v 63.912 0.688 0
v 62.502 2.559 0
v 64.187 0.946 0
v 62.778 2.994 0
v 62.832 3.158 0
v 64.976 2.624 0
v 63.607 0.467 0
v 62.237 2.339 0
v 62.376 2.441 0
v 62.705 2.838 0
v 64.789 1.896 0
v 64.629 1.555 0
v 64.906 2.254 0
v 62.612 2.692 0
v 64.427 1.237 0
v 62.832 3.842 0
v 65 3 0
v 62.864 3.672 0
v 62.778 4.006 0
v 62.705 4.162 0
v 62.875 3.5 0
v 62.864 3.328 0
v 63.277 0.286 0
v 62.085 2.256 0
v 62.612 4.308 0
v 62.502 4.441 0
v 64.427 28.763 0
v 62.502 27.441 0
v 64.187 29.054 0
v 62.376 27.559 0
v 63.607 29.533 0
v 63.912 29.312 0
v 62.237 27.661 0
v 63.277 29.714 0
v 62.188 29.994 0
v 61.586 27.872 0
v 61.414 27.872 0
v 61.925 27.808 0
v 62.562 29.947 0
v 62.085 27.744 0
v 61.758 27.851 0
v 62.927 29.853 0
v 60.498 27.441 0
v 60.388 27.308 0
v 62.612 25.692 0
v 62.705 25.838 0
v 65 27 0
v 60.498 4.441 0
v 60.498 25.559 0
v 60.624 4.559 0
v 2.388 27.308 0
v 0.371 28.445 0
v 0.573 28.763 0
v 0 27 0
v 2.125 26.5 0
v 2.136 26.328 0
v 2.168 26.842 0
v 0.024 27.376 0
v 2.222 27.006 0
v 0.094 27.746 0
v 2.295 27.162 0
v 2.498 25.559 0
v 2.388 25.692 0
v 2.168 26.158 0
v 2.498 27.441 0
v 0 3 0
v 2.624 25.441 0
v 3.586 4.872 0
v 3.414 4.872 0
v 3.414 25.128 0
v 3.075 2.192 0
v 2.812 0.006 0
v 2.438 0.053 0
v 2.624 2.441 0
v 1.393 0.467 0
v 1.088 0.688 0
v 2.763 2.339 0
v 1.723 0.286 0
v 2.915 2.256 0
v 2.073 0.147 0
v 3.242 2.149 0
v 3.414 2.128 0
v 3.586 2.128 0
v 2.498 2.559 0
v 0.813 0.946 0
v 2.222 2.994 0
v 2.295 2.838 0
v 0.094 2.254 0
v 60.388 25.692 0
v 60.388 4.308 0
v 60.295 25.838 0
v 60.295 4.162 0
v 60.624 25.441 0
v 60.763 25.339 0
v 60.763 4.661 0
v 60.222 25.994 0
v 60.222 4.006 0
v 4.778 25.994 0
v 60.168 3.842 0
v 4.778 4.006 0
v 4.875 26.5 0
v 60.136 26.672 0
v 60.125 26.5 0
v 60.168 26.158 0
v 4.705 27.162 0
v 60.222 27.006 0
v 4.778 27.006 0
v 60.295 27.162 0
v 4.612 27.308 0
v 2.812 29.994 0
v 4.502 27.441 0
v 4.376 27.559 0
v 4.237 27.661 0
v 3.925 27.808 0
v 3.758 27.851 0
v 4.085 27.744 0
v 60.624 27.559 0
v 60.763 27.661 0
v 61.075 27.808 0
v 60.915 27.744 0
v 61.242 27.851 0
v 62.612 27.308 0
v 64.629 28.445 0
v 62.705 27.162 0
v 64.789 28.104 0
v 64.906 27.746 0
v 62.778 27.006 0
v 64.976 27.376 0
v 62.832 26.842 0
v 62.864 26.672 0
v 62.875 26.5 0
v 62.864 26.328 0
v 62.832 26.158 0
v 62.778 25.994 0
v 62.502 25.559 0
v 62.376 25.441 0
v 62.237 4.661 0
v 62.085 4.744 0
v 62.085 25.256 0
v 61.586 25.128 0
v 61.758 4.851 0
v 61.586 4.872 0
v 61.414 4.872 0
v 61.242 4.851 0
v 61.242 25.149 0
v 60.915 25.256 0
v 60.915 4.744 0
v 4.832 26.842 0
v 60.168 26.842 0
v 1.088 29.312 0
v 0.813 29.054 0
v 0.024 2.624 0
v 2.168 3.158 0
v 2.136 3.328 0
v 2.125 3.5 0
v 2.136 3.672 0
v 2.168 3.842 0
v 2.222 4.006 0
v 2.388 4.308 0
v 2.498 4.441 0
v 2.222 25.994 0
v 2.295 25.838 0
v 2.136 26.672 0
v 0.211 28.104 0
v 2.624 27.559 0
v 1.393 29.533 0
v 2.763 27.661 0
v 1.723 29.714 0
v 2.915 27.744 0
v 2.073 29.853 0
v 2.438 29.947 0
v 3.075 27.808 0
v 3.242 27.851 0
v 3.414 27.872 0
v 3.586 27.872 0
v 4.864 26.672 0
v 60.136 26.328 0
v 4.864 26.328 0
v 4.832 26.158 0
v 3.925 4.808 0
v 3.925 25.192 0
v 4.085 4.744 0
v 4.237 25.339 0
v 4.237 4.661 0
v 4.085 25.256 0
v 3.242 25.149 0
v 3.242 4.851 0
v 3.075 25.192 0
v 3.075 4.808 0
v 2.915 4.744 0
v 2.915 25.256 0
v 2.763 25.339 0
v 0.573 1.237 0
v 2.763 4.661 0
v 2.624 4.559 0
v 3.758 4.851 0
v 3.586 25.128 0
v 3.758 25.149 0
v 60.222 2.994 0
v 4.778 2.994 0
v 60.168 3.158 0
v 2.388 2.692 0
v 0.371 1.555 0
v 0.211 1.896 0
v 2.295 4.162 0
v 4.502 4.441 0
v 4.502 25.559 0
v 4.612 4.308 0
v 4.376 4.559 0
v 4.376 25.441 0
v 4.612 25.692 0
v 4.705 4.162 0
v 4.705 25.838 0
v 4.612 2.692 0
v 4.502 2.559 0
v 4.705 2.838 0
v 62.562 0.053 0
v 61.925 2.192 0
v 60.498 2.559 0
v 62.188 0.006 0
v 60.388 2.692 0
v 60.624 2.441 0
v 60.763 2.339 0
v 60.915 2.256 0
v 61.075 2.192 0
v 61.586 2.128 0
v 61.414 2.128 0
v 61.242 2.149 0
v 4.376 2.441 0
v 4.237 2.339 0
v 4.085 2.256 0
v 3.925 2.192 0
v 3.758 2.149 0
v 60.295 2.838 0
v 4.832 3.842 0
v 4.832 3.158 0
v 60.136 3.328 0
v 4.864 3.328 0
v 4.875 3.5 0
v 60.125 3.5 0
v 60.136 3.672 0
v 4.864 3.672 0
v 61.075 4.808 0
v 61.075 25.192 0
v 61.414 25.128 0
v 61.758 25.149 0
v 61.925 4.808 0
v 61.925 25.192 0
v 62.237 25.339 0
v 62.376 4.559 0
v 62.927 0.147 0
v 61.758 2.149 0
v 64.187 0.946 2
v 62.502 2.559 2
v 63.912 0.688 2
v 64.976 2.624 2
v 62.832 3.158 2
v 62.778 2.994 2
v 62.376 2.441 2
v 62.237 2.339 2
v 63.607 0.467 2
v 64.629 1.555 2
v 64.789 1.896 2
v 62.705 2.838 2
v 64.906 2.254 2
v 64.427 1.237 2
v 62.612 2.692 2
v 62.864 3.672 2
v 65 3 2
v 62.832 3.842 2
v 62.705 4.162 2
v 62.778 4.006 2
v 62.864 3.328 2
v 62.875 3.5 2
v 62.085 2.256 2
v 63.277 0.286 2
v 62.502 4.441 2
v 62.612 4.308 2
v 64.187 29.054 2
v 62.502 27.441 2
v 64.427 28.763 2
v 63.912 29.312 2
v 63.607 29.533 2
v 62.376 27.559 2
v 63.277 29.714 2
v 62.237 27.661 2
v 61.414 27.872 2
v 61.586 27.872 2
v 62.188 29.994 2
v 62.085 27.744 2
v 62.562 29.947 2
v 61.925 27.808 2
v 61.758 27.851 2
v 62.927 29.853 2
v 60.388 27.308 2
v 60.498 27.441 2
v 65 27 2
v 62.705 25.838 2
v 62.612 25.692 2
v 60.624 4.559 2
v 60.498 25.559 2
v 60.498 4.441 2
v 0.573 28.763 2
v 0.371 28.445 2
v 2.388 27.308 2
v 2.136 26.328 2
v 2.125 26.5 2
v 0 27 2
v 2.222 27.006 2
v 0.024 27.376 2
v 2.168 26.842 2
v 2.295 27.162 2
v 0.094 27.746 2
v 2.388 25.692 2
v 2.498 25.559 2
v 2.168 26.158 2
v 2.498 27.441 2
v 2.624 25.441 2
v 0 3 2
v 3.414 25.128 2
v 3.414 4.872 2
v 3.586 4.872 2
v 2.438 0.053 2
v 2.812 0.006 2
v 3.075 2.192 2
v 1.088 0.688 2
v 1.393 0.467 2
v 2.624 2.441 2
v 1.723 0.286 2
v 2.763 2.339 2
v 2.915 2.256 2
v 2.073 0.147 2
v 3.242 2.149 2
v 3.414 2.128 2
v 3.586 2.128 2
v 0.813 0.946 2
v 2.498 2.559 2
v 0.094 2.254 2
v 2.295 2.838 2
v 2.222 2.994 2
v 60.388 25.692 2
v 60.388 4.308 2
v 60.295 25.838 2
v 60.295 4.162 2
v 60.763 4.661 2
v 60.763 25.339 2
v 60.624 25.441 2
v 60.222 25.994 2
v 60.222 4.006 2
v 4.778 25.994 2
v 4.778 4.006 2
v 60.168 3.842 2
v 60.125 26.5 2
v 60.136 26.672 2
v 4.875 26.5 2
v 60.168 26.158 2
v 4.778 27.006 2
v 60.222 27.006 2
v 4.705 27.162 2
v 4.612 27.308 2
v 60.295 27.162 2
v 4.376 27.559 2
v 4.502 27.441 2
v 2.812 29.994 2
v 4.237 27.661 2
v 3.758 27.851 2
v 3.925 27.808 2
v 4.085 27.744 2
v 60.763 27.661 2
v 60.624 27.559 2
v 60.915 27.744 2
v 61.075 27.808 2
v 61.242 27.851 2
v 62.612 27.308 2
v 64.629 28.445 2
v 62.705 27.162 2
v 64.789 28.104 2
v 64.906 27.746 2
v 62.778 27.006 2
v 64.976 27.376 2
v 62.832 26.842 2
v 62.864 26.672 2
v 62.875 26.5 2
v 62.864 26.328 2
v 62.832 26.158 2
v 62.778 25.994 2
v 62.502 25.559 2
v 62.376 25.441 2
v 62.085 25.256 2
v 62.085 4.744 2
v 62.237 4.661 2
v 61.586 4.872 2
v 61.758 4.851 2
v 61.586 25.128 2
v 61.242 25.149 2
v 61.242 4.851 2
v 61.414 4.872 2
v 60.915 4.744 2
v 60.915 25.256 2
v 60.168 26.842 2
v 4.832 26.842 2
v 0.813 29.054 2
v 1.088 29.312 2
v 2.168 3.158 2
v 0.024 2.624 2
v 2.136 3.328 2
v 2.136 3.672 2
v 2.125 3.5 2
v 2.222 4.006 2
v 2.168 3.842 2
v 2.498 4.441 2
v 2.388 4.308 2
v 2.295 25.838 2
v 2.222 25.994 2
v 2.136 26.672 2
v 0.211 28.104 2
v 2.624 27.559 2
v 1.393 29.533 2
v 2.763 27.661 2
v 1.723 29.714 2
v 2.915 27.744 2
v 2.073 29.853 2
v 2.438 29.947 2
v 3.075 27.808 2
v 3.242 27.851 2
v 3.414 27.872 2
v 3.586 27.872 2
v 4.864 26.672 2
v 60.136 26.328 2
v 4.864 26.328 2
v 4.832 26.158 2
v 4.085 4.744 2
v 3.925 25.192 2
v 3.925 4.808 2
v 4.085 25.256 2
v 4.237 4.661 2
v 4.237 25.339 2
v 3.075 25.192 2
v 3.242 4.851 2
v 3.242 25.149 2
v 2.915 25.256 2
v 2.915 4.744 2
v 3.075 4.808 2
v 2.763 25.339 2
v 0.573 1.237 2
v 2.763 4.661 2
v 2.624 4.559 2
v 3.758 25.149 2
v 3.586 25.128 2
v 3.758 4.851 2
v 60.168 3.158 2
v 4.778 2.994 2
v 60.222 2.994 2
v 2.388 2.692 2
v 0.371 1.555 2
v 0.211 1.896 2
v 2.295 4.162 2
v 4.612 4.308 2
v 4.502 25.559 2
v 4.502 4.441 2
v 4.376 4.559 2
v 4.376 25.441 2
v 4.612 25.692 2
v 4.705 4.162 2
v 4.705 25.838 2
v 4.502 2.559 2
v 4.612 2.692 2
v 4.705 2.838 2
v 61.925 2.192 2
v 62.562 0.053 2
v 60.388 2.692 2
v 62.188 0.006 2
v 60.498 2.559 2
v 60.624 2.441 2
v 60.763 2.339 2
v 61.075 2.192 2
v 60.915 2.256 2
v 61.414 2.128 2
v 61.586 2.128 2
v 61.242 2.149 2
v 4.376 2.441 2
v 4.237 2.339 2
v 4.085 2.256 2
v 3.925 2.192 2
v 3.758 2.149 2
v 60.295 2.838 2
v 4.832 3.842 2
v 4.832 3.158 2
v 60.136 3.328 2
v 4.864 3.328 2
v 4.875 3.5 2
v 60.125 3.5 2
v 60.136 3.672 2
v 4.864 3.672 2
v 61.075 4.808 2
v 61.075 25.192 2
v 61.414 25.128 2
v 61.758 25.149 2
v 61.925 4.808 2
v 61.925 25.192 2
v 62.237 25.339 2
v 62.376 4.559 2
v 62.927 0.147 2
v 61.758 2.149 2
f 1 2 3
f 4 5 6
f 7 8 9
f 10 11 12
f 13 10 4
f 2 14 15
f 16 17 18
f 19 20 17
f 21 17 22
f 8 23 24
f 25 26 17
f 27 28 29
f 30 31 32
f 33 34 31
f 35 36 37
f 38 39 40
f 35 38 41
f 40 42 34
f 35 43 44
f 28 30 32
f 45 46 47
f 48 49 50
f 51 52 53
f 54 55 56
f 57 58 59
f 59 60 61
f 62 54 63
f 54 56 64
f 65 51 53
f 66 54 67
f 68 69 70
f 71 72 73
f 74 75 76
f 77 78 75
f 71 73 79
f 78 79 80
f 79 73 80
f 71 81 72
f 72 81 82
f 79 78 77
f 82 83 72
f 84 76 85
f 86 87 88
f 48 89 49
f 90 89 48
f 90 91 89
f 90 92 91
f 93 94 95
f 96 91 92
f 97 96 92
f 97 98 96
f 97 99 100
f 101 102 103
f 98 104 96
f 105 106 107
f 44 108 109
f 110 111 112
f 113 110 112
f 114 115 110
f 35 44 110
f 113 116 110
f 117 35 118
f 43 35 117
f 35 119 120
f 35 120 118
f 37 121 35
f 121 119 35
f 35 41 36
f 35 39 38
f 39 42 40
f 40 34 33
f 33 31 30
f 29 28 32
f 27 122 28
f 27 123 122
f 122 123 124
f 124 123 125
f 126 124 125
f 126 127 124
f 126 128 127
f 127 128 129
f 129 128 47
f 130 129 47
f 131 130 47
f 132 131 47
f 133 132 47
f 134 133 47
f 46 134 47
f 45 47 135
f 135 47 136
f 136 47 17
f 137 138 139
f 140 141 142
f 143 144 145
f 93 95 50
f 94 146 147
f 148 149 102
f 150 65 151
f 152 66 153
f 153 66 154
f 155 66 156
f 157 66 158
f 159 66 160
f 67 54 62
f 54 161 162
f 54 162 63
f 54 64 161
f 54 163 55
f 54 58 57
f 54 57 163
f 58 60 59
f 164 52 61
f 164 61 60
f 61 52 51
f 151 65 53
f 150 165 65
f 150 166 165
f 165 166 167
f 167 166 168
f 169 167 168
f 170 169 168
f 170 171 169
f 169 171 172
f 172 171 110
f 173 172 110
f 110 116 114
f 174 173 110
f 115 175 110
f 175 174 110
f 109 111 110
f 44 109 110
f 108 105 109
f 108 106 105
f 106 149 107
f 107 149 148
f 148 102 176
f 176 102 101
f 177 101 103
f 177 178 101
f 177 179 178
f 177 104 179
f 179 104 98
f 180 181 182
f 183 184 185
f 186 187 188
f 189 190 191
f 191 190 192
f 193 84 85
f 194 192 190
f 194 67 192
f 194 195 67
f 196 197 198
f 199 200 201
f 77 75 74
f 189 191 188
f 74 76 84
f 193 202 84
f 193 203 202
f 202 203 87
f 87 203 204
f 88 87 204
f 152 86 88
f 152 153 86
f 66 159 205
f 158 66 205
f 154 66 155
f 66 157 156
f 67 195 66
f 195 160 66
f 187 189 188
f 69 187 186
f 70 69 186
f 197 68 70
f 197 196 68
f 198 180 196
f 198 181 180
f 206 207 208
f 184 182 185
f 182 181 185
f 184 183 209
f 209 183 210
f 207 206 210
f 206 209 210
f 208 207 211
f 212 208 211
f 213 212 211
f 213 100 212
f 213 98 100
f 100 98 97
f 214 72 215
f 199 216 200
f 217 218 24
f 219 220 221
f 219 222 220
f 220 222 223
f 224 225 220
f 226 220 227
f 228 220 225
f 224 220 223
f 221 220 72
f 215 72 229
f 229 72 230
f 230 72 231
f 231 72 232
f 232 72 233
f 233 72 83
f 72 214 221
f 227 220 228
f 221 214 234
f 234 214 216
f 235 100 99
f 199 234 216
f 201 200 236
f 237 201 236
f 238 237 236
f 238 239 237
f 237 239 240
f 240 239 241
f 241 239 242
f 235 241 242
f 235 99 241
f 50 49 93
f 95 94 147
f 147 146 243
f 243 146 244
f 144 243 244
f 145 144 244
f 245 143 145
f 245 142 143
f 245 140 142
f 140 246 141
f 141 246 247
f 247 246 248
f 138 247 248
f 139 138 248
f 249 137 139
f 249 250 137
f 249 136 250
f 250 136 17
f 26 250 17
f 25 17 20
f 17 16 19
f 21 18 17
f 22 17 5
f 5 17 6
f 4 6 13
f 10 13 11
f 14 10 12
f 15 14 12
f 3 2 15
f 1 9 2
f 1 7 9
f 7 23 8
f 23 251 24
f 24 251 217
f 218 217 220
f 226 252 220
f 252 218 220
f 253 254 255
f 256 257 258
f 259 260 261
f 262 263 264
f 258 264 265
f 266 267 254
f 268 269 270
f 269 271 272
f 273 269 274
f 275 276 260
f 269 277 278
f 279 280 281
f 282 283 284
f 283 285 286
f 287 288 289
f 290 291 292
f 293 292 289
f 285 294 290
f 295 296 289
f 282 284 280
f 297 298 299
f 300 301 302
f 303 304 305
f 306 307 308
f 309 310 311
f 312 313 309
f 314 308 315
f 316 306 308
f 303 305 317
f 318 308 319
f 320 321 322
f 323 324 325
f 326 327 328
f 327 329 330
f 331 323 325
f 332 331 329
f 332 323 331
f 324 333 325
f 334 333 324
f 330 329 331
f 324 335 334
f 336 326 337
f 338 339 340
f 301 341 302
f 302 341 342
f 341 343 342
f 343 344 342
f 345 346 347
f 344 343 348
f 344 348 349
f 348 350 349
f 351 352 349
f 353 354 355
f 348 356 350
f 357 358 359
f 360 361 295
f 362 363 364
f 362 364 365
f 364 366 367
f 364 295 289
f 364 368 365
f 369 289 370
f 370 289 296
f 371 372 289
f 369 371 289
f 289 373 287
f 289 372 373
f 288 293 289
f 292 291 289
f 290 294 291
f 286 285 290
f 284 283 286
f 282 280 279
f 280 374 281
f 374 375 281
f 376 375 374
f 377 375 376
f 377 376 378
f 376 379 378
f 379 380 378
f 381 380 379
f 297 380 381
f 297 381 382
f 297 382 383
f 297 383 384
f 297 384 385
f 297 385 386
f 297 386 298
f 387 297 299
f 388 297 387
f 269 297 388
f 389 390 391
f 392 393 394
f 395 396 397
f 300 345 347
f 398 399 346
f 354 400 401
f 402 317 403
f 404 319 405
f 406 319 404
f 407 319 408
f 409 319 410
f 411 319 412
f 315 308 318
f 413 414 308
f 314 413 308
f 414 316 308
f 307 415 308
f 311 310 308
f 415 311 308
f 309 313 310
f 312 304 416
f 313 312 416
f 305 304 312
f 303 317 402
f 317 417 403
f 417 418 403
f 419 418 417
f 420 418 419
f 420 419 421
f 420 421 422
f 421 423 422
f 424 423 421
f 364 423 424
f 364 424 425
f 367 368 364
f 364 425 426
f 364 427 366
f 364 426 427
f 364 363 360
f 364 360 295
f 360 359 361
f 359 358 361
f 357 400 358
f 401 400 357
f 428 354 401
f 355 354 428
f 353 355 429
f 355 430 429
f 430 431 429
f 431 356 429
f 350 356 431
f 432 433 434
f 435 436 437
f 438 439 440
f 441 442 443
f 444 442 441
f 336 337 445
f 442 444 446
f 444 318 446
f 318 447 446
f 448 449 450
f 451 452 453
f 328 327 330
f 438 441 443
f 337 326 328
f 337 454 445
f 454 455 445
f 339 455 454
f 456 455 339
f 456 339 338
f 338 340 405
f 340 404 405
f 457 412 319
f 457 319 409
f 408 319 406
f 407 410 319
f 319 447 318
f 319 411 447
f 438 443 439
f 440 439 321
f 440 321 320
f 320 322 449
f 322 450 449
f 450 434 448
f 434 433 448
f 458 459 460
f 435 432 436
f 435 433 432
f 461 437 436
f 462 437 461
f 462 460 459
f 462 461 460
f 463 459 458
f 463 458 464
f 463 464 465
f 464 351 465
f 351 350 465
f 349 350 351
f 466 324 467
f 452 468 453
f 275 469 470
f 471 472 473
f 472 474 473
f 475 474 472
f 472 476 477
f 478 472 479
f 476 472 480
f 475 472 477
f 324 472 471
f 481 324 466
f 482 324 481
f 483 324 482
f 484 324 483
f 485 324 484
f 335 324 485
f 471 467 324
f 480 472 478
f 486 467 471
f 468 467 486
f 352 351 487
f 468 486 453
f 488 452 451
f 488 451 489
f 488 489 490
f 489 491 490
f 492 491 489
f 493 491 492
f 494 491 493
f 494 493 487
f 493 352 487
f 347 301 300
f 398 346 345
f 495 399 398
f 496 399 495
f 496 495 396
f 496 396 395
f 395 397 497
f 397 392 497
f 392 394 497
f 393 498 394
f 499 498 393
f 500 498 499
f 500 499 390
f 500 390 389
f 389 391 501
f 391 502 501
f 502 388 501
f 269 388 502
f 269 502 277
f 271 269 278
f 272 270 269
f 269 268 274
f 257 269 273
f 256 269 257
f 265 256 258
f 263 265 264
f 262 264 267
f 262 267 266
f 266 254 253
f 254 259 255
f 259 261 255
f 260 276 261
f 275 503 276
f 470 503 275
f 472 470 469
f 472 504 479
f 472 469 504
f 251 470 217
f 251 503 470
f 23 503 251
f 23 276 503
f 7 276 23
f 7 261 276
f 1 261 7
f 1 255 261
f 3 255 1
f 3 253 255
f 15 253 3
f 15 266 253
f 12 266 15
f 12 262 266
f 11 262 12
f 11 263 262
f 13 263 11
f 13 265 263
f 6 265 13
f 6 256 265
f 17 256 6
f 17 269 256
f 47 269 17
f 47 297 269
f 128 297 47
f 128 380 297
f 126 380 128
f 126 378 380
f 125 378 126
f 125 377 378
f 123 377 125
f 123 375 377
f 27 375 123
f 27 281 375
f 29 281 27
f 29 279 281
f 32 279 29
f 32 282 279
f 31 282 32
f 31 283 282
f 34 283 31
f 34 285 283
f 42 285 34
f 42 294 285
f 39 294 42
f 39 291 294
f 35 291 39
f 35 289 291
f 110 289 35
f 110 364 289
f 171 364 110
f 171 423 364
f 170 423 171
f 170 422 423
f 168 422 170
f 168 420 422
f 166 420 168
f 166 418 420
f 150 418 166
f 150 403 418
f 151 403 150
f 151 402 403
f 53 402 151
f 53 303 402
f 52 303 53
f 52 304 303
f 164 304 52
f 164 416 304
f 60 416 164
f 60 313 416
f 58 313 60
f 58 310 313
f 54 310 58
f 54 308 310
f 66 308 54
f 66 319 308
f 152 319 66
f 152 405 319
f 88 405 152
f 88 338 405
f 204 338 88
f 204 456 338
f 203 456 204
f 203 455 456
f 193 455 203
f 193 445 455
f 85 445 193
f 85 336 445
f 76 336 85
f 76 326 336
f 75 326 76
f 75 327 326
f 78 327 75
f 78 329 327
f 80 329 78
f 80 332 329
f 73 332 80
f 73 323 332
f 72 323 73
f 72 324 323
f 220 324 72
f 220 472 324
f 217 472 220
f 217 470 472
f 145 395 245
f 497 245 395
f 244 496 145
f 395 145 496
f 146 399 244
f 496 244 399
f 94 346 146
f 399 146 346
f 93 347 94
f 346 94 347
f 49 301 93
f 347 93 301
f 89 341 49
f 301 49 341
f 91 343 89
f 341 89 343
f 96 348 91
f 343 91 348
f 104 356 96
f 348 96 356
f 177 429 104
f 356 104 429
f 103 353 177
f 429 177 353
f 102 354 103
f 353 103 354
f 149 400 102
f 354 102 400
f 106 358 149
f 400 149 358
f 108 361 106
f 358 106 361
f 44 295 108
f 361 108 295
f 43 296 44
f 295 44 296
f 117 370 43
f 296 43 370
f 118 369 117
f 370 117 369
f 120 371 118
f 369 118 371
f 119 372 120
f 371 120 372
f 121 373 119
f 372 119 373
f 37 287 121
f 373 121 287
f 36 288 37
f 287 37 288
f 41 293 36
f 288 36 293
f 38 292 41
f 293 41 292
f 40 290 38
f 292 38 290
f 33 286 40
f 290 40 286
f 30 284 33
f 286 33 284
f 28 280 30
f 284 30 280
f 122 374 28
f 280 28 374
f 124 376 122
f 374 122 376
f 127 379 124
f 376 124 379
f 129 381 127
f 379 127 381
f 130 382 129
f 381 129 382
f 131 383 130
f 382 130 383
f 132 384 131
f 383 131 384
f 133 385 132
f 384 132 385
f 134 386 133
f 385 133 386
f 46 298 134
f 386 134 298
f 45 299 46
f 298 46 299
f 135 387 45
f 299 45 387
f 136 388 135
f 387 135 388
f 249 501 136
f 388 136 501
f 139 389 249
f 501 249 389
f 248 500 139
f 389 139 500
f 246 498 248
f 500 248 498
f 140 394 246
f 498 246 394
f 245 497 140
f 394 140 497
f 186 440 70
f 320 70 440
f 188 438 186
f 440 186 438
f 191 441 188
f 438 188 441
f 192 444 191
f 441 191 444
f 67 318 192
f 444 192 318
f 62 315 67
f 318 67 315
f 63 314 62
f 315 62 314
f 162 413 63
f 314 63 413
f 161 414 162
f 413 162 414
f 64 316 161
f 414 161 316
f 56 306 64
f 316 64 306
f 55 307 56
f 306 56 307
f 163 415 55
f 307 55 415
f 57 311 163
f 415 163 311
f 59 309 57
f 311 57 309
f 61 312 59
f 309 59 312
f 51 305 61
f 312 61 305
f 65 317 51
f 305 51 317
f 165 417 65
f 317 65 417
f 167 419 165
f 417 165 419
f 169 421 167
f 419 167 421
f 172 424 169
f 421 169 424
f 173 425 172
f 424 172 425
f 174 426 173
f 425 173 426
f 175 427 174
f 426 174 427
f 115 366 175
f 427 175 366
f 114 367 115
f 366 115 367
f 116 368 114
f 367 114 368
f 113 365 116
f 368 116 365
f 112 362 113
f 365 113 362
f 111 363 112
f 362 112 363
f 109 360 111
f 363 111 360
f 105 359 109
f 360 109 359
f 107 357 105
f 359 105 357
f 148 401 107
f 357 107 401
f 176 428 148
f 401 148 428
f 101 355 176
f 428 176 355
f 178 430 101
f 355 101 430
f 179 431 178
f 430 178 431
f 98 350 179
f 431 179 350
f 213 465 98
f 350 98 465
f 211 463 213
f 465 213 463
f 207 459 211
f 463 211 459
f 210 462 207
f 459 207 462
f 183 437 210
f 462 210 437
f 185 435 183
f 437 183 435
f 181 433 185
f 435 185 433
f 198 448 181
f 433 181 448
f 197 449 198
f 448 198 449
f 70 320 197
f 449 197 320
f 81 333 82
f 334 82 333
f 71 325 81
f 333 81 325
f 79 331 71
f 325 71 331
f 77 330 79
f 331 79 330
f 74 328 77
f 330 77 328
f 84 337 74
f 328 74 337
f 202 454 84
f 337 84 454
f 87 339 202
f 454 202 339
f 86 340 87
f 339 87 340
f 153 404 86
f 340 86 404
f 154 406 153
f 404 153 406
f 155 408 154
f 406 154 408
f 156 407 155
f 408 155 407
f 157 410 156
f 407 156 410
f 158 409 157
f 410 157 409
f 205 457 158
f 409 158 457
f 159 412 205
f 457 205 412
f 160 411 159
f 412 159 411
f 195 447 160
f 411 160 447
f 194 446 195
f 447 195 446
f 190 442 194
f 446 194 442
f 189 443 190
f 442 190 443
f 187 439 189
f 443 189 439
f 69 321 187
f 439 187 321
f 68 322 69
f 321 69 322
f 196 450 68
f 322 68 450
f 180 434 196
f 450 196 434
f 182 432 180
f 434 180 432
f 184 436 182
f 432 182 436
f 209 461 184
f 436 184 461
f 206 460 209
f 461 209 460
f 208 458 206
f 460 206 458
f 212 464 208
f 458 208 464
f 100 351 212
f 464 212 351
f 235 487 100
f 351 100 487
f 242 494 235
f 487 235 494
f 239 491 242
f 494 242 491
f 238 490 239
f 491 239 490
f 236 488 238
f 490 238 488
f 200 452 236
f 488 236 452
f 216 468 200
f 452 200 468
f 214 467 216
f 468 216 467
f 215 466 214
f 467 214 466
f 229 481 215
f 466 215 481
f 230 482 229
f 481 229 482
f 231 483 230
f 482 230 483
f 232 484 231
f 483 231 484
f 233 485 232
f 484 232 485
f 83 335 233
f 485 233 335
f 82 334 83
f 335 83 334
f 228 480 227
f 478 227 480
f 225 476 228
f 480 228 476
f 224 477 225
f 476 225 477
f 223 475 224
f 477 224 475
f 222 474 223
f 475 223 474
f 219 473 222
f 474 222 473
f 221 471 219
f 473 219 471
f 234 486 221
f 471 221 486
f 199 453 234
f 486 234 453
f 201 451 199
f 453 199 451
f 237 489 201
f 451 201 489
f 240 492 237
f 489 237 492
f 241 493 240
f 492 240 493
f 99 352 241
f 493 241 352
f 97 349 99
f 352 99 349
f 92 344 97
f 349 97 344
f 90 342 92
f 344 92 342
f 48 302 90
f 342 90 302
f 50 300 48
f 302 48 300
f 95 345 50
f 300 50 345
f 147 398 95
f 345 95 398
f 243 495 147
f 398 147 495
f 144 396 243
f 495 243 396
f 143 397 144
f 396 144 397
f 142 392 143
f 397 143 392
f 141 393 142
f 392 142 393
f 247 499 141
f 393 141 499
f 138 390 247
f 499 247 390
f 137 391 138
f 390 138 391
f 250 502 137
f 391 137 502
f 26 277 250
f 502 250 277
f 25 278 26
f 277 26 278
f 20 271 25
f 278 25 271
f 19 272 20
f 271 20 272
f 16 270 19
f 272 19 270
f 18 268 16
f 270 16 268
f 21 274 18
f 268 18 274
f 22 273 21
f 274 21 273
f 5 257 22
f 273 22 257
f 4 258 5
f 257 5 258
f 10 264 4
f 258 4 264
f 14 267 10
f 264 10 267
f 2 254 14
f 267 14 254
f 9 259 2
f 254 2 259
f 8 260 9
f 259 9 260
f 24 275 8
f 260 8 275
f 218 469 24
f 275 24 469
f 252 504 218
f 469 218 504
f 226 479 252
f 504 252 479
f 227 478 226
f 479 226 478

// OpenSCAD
$fn = 50;

corner_radius = 3;

width = 65;
height = 30;
mounting_hole_diameter = 2.75;
mounting_hole_offset = 3.5;


module pi_zero_body(){
    minkowski(){
        square([width - corner_radius * 2, height - corner_radius * 2]);
        circle(corner_radius);
    }
}

module hole(){
    circle(d = mounting_hole_diameter);
}

module holes(){
    
    translate([-corner_radius + mounting_hole_offset, -corner_radius + mounting_hole_offset, 0]){
        hole();
    }
    translate([-corner_radius + width - mounting_hole_offset, -corner_radius + mounting_hole_offset, 0]){
        hole();
    }
    translate([-corner_radius + width - mounting_hole_offset, -corner_radius +  height - mounting_hole_offset, 0]){
        hole();
    }

    translate([-corner_radius + mounting_hole_offset, -corner_radius +  height - mounting_hole_offset, 0]){
        hole();
    }
}
module raspberry_pi_zero(){
    translate([corner_radius, corner_radius, 0]) {
        color("green") {
            linear_extrude(2){
                difference() {
                    pi_zero_body();
                    holes();
                    
                }
            }
        }
        
    }
    
}
raspberry_pi_zero();
